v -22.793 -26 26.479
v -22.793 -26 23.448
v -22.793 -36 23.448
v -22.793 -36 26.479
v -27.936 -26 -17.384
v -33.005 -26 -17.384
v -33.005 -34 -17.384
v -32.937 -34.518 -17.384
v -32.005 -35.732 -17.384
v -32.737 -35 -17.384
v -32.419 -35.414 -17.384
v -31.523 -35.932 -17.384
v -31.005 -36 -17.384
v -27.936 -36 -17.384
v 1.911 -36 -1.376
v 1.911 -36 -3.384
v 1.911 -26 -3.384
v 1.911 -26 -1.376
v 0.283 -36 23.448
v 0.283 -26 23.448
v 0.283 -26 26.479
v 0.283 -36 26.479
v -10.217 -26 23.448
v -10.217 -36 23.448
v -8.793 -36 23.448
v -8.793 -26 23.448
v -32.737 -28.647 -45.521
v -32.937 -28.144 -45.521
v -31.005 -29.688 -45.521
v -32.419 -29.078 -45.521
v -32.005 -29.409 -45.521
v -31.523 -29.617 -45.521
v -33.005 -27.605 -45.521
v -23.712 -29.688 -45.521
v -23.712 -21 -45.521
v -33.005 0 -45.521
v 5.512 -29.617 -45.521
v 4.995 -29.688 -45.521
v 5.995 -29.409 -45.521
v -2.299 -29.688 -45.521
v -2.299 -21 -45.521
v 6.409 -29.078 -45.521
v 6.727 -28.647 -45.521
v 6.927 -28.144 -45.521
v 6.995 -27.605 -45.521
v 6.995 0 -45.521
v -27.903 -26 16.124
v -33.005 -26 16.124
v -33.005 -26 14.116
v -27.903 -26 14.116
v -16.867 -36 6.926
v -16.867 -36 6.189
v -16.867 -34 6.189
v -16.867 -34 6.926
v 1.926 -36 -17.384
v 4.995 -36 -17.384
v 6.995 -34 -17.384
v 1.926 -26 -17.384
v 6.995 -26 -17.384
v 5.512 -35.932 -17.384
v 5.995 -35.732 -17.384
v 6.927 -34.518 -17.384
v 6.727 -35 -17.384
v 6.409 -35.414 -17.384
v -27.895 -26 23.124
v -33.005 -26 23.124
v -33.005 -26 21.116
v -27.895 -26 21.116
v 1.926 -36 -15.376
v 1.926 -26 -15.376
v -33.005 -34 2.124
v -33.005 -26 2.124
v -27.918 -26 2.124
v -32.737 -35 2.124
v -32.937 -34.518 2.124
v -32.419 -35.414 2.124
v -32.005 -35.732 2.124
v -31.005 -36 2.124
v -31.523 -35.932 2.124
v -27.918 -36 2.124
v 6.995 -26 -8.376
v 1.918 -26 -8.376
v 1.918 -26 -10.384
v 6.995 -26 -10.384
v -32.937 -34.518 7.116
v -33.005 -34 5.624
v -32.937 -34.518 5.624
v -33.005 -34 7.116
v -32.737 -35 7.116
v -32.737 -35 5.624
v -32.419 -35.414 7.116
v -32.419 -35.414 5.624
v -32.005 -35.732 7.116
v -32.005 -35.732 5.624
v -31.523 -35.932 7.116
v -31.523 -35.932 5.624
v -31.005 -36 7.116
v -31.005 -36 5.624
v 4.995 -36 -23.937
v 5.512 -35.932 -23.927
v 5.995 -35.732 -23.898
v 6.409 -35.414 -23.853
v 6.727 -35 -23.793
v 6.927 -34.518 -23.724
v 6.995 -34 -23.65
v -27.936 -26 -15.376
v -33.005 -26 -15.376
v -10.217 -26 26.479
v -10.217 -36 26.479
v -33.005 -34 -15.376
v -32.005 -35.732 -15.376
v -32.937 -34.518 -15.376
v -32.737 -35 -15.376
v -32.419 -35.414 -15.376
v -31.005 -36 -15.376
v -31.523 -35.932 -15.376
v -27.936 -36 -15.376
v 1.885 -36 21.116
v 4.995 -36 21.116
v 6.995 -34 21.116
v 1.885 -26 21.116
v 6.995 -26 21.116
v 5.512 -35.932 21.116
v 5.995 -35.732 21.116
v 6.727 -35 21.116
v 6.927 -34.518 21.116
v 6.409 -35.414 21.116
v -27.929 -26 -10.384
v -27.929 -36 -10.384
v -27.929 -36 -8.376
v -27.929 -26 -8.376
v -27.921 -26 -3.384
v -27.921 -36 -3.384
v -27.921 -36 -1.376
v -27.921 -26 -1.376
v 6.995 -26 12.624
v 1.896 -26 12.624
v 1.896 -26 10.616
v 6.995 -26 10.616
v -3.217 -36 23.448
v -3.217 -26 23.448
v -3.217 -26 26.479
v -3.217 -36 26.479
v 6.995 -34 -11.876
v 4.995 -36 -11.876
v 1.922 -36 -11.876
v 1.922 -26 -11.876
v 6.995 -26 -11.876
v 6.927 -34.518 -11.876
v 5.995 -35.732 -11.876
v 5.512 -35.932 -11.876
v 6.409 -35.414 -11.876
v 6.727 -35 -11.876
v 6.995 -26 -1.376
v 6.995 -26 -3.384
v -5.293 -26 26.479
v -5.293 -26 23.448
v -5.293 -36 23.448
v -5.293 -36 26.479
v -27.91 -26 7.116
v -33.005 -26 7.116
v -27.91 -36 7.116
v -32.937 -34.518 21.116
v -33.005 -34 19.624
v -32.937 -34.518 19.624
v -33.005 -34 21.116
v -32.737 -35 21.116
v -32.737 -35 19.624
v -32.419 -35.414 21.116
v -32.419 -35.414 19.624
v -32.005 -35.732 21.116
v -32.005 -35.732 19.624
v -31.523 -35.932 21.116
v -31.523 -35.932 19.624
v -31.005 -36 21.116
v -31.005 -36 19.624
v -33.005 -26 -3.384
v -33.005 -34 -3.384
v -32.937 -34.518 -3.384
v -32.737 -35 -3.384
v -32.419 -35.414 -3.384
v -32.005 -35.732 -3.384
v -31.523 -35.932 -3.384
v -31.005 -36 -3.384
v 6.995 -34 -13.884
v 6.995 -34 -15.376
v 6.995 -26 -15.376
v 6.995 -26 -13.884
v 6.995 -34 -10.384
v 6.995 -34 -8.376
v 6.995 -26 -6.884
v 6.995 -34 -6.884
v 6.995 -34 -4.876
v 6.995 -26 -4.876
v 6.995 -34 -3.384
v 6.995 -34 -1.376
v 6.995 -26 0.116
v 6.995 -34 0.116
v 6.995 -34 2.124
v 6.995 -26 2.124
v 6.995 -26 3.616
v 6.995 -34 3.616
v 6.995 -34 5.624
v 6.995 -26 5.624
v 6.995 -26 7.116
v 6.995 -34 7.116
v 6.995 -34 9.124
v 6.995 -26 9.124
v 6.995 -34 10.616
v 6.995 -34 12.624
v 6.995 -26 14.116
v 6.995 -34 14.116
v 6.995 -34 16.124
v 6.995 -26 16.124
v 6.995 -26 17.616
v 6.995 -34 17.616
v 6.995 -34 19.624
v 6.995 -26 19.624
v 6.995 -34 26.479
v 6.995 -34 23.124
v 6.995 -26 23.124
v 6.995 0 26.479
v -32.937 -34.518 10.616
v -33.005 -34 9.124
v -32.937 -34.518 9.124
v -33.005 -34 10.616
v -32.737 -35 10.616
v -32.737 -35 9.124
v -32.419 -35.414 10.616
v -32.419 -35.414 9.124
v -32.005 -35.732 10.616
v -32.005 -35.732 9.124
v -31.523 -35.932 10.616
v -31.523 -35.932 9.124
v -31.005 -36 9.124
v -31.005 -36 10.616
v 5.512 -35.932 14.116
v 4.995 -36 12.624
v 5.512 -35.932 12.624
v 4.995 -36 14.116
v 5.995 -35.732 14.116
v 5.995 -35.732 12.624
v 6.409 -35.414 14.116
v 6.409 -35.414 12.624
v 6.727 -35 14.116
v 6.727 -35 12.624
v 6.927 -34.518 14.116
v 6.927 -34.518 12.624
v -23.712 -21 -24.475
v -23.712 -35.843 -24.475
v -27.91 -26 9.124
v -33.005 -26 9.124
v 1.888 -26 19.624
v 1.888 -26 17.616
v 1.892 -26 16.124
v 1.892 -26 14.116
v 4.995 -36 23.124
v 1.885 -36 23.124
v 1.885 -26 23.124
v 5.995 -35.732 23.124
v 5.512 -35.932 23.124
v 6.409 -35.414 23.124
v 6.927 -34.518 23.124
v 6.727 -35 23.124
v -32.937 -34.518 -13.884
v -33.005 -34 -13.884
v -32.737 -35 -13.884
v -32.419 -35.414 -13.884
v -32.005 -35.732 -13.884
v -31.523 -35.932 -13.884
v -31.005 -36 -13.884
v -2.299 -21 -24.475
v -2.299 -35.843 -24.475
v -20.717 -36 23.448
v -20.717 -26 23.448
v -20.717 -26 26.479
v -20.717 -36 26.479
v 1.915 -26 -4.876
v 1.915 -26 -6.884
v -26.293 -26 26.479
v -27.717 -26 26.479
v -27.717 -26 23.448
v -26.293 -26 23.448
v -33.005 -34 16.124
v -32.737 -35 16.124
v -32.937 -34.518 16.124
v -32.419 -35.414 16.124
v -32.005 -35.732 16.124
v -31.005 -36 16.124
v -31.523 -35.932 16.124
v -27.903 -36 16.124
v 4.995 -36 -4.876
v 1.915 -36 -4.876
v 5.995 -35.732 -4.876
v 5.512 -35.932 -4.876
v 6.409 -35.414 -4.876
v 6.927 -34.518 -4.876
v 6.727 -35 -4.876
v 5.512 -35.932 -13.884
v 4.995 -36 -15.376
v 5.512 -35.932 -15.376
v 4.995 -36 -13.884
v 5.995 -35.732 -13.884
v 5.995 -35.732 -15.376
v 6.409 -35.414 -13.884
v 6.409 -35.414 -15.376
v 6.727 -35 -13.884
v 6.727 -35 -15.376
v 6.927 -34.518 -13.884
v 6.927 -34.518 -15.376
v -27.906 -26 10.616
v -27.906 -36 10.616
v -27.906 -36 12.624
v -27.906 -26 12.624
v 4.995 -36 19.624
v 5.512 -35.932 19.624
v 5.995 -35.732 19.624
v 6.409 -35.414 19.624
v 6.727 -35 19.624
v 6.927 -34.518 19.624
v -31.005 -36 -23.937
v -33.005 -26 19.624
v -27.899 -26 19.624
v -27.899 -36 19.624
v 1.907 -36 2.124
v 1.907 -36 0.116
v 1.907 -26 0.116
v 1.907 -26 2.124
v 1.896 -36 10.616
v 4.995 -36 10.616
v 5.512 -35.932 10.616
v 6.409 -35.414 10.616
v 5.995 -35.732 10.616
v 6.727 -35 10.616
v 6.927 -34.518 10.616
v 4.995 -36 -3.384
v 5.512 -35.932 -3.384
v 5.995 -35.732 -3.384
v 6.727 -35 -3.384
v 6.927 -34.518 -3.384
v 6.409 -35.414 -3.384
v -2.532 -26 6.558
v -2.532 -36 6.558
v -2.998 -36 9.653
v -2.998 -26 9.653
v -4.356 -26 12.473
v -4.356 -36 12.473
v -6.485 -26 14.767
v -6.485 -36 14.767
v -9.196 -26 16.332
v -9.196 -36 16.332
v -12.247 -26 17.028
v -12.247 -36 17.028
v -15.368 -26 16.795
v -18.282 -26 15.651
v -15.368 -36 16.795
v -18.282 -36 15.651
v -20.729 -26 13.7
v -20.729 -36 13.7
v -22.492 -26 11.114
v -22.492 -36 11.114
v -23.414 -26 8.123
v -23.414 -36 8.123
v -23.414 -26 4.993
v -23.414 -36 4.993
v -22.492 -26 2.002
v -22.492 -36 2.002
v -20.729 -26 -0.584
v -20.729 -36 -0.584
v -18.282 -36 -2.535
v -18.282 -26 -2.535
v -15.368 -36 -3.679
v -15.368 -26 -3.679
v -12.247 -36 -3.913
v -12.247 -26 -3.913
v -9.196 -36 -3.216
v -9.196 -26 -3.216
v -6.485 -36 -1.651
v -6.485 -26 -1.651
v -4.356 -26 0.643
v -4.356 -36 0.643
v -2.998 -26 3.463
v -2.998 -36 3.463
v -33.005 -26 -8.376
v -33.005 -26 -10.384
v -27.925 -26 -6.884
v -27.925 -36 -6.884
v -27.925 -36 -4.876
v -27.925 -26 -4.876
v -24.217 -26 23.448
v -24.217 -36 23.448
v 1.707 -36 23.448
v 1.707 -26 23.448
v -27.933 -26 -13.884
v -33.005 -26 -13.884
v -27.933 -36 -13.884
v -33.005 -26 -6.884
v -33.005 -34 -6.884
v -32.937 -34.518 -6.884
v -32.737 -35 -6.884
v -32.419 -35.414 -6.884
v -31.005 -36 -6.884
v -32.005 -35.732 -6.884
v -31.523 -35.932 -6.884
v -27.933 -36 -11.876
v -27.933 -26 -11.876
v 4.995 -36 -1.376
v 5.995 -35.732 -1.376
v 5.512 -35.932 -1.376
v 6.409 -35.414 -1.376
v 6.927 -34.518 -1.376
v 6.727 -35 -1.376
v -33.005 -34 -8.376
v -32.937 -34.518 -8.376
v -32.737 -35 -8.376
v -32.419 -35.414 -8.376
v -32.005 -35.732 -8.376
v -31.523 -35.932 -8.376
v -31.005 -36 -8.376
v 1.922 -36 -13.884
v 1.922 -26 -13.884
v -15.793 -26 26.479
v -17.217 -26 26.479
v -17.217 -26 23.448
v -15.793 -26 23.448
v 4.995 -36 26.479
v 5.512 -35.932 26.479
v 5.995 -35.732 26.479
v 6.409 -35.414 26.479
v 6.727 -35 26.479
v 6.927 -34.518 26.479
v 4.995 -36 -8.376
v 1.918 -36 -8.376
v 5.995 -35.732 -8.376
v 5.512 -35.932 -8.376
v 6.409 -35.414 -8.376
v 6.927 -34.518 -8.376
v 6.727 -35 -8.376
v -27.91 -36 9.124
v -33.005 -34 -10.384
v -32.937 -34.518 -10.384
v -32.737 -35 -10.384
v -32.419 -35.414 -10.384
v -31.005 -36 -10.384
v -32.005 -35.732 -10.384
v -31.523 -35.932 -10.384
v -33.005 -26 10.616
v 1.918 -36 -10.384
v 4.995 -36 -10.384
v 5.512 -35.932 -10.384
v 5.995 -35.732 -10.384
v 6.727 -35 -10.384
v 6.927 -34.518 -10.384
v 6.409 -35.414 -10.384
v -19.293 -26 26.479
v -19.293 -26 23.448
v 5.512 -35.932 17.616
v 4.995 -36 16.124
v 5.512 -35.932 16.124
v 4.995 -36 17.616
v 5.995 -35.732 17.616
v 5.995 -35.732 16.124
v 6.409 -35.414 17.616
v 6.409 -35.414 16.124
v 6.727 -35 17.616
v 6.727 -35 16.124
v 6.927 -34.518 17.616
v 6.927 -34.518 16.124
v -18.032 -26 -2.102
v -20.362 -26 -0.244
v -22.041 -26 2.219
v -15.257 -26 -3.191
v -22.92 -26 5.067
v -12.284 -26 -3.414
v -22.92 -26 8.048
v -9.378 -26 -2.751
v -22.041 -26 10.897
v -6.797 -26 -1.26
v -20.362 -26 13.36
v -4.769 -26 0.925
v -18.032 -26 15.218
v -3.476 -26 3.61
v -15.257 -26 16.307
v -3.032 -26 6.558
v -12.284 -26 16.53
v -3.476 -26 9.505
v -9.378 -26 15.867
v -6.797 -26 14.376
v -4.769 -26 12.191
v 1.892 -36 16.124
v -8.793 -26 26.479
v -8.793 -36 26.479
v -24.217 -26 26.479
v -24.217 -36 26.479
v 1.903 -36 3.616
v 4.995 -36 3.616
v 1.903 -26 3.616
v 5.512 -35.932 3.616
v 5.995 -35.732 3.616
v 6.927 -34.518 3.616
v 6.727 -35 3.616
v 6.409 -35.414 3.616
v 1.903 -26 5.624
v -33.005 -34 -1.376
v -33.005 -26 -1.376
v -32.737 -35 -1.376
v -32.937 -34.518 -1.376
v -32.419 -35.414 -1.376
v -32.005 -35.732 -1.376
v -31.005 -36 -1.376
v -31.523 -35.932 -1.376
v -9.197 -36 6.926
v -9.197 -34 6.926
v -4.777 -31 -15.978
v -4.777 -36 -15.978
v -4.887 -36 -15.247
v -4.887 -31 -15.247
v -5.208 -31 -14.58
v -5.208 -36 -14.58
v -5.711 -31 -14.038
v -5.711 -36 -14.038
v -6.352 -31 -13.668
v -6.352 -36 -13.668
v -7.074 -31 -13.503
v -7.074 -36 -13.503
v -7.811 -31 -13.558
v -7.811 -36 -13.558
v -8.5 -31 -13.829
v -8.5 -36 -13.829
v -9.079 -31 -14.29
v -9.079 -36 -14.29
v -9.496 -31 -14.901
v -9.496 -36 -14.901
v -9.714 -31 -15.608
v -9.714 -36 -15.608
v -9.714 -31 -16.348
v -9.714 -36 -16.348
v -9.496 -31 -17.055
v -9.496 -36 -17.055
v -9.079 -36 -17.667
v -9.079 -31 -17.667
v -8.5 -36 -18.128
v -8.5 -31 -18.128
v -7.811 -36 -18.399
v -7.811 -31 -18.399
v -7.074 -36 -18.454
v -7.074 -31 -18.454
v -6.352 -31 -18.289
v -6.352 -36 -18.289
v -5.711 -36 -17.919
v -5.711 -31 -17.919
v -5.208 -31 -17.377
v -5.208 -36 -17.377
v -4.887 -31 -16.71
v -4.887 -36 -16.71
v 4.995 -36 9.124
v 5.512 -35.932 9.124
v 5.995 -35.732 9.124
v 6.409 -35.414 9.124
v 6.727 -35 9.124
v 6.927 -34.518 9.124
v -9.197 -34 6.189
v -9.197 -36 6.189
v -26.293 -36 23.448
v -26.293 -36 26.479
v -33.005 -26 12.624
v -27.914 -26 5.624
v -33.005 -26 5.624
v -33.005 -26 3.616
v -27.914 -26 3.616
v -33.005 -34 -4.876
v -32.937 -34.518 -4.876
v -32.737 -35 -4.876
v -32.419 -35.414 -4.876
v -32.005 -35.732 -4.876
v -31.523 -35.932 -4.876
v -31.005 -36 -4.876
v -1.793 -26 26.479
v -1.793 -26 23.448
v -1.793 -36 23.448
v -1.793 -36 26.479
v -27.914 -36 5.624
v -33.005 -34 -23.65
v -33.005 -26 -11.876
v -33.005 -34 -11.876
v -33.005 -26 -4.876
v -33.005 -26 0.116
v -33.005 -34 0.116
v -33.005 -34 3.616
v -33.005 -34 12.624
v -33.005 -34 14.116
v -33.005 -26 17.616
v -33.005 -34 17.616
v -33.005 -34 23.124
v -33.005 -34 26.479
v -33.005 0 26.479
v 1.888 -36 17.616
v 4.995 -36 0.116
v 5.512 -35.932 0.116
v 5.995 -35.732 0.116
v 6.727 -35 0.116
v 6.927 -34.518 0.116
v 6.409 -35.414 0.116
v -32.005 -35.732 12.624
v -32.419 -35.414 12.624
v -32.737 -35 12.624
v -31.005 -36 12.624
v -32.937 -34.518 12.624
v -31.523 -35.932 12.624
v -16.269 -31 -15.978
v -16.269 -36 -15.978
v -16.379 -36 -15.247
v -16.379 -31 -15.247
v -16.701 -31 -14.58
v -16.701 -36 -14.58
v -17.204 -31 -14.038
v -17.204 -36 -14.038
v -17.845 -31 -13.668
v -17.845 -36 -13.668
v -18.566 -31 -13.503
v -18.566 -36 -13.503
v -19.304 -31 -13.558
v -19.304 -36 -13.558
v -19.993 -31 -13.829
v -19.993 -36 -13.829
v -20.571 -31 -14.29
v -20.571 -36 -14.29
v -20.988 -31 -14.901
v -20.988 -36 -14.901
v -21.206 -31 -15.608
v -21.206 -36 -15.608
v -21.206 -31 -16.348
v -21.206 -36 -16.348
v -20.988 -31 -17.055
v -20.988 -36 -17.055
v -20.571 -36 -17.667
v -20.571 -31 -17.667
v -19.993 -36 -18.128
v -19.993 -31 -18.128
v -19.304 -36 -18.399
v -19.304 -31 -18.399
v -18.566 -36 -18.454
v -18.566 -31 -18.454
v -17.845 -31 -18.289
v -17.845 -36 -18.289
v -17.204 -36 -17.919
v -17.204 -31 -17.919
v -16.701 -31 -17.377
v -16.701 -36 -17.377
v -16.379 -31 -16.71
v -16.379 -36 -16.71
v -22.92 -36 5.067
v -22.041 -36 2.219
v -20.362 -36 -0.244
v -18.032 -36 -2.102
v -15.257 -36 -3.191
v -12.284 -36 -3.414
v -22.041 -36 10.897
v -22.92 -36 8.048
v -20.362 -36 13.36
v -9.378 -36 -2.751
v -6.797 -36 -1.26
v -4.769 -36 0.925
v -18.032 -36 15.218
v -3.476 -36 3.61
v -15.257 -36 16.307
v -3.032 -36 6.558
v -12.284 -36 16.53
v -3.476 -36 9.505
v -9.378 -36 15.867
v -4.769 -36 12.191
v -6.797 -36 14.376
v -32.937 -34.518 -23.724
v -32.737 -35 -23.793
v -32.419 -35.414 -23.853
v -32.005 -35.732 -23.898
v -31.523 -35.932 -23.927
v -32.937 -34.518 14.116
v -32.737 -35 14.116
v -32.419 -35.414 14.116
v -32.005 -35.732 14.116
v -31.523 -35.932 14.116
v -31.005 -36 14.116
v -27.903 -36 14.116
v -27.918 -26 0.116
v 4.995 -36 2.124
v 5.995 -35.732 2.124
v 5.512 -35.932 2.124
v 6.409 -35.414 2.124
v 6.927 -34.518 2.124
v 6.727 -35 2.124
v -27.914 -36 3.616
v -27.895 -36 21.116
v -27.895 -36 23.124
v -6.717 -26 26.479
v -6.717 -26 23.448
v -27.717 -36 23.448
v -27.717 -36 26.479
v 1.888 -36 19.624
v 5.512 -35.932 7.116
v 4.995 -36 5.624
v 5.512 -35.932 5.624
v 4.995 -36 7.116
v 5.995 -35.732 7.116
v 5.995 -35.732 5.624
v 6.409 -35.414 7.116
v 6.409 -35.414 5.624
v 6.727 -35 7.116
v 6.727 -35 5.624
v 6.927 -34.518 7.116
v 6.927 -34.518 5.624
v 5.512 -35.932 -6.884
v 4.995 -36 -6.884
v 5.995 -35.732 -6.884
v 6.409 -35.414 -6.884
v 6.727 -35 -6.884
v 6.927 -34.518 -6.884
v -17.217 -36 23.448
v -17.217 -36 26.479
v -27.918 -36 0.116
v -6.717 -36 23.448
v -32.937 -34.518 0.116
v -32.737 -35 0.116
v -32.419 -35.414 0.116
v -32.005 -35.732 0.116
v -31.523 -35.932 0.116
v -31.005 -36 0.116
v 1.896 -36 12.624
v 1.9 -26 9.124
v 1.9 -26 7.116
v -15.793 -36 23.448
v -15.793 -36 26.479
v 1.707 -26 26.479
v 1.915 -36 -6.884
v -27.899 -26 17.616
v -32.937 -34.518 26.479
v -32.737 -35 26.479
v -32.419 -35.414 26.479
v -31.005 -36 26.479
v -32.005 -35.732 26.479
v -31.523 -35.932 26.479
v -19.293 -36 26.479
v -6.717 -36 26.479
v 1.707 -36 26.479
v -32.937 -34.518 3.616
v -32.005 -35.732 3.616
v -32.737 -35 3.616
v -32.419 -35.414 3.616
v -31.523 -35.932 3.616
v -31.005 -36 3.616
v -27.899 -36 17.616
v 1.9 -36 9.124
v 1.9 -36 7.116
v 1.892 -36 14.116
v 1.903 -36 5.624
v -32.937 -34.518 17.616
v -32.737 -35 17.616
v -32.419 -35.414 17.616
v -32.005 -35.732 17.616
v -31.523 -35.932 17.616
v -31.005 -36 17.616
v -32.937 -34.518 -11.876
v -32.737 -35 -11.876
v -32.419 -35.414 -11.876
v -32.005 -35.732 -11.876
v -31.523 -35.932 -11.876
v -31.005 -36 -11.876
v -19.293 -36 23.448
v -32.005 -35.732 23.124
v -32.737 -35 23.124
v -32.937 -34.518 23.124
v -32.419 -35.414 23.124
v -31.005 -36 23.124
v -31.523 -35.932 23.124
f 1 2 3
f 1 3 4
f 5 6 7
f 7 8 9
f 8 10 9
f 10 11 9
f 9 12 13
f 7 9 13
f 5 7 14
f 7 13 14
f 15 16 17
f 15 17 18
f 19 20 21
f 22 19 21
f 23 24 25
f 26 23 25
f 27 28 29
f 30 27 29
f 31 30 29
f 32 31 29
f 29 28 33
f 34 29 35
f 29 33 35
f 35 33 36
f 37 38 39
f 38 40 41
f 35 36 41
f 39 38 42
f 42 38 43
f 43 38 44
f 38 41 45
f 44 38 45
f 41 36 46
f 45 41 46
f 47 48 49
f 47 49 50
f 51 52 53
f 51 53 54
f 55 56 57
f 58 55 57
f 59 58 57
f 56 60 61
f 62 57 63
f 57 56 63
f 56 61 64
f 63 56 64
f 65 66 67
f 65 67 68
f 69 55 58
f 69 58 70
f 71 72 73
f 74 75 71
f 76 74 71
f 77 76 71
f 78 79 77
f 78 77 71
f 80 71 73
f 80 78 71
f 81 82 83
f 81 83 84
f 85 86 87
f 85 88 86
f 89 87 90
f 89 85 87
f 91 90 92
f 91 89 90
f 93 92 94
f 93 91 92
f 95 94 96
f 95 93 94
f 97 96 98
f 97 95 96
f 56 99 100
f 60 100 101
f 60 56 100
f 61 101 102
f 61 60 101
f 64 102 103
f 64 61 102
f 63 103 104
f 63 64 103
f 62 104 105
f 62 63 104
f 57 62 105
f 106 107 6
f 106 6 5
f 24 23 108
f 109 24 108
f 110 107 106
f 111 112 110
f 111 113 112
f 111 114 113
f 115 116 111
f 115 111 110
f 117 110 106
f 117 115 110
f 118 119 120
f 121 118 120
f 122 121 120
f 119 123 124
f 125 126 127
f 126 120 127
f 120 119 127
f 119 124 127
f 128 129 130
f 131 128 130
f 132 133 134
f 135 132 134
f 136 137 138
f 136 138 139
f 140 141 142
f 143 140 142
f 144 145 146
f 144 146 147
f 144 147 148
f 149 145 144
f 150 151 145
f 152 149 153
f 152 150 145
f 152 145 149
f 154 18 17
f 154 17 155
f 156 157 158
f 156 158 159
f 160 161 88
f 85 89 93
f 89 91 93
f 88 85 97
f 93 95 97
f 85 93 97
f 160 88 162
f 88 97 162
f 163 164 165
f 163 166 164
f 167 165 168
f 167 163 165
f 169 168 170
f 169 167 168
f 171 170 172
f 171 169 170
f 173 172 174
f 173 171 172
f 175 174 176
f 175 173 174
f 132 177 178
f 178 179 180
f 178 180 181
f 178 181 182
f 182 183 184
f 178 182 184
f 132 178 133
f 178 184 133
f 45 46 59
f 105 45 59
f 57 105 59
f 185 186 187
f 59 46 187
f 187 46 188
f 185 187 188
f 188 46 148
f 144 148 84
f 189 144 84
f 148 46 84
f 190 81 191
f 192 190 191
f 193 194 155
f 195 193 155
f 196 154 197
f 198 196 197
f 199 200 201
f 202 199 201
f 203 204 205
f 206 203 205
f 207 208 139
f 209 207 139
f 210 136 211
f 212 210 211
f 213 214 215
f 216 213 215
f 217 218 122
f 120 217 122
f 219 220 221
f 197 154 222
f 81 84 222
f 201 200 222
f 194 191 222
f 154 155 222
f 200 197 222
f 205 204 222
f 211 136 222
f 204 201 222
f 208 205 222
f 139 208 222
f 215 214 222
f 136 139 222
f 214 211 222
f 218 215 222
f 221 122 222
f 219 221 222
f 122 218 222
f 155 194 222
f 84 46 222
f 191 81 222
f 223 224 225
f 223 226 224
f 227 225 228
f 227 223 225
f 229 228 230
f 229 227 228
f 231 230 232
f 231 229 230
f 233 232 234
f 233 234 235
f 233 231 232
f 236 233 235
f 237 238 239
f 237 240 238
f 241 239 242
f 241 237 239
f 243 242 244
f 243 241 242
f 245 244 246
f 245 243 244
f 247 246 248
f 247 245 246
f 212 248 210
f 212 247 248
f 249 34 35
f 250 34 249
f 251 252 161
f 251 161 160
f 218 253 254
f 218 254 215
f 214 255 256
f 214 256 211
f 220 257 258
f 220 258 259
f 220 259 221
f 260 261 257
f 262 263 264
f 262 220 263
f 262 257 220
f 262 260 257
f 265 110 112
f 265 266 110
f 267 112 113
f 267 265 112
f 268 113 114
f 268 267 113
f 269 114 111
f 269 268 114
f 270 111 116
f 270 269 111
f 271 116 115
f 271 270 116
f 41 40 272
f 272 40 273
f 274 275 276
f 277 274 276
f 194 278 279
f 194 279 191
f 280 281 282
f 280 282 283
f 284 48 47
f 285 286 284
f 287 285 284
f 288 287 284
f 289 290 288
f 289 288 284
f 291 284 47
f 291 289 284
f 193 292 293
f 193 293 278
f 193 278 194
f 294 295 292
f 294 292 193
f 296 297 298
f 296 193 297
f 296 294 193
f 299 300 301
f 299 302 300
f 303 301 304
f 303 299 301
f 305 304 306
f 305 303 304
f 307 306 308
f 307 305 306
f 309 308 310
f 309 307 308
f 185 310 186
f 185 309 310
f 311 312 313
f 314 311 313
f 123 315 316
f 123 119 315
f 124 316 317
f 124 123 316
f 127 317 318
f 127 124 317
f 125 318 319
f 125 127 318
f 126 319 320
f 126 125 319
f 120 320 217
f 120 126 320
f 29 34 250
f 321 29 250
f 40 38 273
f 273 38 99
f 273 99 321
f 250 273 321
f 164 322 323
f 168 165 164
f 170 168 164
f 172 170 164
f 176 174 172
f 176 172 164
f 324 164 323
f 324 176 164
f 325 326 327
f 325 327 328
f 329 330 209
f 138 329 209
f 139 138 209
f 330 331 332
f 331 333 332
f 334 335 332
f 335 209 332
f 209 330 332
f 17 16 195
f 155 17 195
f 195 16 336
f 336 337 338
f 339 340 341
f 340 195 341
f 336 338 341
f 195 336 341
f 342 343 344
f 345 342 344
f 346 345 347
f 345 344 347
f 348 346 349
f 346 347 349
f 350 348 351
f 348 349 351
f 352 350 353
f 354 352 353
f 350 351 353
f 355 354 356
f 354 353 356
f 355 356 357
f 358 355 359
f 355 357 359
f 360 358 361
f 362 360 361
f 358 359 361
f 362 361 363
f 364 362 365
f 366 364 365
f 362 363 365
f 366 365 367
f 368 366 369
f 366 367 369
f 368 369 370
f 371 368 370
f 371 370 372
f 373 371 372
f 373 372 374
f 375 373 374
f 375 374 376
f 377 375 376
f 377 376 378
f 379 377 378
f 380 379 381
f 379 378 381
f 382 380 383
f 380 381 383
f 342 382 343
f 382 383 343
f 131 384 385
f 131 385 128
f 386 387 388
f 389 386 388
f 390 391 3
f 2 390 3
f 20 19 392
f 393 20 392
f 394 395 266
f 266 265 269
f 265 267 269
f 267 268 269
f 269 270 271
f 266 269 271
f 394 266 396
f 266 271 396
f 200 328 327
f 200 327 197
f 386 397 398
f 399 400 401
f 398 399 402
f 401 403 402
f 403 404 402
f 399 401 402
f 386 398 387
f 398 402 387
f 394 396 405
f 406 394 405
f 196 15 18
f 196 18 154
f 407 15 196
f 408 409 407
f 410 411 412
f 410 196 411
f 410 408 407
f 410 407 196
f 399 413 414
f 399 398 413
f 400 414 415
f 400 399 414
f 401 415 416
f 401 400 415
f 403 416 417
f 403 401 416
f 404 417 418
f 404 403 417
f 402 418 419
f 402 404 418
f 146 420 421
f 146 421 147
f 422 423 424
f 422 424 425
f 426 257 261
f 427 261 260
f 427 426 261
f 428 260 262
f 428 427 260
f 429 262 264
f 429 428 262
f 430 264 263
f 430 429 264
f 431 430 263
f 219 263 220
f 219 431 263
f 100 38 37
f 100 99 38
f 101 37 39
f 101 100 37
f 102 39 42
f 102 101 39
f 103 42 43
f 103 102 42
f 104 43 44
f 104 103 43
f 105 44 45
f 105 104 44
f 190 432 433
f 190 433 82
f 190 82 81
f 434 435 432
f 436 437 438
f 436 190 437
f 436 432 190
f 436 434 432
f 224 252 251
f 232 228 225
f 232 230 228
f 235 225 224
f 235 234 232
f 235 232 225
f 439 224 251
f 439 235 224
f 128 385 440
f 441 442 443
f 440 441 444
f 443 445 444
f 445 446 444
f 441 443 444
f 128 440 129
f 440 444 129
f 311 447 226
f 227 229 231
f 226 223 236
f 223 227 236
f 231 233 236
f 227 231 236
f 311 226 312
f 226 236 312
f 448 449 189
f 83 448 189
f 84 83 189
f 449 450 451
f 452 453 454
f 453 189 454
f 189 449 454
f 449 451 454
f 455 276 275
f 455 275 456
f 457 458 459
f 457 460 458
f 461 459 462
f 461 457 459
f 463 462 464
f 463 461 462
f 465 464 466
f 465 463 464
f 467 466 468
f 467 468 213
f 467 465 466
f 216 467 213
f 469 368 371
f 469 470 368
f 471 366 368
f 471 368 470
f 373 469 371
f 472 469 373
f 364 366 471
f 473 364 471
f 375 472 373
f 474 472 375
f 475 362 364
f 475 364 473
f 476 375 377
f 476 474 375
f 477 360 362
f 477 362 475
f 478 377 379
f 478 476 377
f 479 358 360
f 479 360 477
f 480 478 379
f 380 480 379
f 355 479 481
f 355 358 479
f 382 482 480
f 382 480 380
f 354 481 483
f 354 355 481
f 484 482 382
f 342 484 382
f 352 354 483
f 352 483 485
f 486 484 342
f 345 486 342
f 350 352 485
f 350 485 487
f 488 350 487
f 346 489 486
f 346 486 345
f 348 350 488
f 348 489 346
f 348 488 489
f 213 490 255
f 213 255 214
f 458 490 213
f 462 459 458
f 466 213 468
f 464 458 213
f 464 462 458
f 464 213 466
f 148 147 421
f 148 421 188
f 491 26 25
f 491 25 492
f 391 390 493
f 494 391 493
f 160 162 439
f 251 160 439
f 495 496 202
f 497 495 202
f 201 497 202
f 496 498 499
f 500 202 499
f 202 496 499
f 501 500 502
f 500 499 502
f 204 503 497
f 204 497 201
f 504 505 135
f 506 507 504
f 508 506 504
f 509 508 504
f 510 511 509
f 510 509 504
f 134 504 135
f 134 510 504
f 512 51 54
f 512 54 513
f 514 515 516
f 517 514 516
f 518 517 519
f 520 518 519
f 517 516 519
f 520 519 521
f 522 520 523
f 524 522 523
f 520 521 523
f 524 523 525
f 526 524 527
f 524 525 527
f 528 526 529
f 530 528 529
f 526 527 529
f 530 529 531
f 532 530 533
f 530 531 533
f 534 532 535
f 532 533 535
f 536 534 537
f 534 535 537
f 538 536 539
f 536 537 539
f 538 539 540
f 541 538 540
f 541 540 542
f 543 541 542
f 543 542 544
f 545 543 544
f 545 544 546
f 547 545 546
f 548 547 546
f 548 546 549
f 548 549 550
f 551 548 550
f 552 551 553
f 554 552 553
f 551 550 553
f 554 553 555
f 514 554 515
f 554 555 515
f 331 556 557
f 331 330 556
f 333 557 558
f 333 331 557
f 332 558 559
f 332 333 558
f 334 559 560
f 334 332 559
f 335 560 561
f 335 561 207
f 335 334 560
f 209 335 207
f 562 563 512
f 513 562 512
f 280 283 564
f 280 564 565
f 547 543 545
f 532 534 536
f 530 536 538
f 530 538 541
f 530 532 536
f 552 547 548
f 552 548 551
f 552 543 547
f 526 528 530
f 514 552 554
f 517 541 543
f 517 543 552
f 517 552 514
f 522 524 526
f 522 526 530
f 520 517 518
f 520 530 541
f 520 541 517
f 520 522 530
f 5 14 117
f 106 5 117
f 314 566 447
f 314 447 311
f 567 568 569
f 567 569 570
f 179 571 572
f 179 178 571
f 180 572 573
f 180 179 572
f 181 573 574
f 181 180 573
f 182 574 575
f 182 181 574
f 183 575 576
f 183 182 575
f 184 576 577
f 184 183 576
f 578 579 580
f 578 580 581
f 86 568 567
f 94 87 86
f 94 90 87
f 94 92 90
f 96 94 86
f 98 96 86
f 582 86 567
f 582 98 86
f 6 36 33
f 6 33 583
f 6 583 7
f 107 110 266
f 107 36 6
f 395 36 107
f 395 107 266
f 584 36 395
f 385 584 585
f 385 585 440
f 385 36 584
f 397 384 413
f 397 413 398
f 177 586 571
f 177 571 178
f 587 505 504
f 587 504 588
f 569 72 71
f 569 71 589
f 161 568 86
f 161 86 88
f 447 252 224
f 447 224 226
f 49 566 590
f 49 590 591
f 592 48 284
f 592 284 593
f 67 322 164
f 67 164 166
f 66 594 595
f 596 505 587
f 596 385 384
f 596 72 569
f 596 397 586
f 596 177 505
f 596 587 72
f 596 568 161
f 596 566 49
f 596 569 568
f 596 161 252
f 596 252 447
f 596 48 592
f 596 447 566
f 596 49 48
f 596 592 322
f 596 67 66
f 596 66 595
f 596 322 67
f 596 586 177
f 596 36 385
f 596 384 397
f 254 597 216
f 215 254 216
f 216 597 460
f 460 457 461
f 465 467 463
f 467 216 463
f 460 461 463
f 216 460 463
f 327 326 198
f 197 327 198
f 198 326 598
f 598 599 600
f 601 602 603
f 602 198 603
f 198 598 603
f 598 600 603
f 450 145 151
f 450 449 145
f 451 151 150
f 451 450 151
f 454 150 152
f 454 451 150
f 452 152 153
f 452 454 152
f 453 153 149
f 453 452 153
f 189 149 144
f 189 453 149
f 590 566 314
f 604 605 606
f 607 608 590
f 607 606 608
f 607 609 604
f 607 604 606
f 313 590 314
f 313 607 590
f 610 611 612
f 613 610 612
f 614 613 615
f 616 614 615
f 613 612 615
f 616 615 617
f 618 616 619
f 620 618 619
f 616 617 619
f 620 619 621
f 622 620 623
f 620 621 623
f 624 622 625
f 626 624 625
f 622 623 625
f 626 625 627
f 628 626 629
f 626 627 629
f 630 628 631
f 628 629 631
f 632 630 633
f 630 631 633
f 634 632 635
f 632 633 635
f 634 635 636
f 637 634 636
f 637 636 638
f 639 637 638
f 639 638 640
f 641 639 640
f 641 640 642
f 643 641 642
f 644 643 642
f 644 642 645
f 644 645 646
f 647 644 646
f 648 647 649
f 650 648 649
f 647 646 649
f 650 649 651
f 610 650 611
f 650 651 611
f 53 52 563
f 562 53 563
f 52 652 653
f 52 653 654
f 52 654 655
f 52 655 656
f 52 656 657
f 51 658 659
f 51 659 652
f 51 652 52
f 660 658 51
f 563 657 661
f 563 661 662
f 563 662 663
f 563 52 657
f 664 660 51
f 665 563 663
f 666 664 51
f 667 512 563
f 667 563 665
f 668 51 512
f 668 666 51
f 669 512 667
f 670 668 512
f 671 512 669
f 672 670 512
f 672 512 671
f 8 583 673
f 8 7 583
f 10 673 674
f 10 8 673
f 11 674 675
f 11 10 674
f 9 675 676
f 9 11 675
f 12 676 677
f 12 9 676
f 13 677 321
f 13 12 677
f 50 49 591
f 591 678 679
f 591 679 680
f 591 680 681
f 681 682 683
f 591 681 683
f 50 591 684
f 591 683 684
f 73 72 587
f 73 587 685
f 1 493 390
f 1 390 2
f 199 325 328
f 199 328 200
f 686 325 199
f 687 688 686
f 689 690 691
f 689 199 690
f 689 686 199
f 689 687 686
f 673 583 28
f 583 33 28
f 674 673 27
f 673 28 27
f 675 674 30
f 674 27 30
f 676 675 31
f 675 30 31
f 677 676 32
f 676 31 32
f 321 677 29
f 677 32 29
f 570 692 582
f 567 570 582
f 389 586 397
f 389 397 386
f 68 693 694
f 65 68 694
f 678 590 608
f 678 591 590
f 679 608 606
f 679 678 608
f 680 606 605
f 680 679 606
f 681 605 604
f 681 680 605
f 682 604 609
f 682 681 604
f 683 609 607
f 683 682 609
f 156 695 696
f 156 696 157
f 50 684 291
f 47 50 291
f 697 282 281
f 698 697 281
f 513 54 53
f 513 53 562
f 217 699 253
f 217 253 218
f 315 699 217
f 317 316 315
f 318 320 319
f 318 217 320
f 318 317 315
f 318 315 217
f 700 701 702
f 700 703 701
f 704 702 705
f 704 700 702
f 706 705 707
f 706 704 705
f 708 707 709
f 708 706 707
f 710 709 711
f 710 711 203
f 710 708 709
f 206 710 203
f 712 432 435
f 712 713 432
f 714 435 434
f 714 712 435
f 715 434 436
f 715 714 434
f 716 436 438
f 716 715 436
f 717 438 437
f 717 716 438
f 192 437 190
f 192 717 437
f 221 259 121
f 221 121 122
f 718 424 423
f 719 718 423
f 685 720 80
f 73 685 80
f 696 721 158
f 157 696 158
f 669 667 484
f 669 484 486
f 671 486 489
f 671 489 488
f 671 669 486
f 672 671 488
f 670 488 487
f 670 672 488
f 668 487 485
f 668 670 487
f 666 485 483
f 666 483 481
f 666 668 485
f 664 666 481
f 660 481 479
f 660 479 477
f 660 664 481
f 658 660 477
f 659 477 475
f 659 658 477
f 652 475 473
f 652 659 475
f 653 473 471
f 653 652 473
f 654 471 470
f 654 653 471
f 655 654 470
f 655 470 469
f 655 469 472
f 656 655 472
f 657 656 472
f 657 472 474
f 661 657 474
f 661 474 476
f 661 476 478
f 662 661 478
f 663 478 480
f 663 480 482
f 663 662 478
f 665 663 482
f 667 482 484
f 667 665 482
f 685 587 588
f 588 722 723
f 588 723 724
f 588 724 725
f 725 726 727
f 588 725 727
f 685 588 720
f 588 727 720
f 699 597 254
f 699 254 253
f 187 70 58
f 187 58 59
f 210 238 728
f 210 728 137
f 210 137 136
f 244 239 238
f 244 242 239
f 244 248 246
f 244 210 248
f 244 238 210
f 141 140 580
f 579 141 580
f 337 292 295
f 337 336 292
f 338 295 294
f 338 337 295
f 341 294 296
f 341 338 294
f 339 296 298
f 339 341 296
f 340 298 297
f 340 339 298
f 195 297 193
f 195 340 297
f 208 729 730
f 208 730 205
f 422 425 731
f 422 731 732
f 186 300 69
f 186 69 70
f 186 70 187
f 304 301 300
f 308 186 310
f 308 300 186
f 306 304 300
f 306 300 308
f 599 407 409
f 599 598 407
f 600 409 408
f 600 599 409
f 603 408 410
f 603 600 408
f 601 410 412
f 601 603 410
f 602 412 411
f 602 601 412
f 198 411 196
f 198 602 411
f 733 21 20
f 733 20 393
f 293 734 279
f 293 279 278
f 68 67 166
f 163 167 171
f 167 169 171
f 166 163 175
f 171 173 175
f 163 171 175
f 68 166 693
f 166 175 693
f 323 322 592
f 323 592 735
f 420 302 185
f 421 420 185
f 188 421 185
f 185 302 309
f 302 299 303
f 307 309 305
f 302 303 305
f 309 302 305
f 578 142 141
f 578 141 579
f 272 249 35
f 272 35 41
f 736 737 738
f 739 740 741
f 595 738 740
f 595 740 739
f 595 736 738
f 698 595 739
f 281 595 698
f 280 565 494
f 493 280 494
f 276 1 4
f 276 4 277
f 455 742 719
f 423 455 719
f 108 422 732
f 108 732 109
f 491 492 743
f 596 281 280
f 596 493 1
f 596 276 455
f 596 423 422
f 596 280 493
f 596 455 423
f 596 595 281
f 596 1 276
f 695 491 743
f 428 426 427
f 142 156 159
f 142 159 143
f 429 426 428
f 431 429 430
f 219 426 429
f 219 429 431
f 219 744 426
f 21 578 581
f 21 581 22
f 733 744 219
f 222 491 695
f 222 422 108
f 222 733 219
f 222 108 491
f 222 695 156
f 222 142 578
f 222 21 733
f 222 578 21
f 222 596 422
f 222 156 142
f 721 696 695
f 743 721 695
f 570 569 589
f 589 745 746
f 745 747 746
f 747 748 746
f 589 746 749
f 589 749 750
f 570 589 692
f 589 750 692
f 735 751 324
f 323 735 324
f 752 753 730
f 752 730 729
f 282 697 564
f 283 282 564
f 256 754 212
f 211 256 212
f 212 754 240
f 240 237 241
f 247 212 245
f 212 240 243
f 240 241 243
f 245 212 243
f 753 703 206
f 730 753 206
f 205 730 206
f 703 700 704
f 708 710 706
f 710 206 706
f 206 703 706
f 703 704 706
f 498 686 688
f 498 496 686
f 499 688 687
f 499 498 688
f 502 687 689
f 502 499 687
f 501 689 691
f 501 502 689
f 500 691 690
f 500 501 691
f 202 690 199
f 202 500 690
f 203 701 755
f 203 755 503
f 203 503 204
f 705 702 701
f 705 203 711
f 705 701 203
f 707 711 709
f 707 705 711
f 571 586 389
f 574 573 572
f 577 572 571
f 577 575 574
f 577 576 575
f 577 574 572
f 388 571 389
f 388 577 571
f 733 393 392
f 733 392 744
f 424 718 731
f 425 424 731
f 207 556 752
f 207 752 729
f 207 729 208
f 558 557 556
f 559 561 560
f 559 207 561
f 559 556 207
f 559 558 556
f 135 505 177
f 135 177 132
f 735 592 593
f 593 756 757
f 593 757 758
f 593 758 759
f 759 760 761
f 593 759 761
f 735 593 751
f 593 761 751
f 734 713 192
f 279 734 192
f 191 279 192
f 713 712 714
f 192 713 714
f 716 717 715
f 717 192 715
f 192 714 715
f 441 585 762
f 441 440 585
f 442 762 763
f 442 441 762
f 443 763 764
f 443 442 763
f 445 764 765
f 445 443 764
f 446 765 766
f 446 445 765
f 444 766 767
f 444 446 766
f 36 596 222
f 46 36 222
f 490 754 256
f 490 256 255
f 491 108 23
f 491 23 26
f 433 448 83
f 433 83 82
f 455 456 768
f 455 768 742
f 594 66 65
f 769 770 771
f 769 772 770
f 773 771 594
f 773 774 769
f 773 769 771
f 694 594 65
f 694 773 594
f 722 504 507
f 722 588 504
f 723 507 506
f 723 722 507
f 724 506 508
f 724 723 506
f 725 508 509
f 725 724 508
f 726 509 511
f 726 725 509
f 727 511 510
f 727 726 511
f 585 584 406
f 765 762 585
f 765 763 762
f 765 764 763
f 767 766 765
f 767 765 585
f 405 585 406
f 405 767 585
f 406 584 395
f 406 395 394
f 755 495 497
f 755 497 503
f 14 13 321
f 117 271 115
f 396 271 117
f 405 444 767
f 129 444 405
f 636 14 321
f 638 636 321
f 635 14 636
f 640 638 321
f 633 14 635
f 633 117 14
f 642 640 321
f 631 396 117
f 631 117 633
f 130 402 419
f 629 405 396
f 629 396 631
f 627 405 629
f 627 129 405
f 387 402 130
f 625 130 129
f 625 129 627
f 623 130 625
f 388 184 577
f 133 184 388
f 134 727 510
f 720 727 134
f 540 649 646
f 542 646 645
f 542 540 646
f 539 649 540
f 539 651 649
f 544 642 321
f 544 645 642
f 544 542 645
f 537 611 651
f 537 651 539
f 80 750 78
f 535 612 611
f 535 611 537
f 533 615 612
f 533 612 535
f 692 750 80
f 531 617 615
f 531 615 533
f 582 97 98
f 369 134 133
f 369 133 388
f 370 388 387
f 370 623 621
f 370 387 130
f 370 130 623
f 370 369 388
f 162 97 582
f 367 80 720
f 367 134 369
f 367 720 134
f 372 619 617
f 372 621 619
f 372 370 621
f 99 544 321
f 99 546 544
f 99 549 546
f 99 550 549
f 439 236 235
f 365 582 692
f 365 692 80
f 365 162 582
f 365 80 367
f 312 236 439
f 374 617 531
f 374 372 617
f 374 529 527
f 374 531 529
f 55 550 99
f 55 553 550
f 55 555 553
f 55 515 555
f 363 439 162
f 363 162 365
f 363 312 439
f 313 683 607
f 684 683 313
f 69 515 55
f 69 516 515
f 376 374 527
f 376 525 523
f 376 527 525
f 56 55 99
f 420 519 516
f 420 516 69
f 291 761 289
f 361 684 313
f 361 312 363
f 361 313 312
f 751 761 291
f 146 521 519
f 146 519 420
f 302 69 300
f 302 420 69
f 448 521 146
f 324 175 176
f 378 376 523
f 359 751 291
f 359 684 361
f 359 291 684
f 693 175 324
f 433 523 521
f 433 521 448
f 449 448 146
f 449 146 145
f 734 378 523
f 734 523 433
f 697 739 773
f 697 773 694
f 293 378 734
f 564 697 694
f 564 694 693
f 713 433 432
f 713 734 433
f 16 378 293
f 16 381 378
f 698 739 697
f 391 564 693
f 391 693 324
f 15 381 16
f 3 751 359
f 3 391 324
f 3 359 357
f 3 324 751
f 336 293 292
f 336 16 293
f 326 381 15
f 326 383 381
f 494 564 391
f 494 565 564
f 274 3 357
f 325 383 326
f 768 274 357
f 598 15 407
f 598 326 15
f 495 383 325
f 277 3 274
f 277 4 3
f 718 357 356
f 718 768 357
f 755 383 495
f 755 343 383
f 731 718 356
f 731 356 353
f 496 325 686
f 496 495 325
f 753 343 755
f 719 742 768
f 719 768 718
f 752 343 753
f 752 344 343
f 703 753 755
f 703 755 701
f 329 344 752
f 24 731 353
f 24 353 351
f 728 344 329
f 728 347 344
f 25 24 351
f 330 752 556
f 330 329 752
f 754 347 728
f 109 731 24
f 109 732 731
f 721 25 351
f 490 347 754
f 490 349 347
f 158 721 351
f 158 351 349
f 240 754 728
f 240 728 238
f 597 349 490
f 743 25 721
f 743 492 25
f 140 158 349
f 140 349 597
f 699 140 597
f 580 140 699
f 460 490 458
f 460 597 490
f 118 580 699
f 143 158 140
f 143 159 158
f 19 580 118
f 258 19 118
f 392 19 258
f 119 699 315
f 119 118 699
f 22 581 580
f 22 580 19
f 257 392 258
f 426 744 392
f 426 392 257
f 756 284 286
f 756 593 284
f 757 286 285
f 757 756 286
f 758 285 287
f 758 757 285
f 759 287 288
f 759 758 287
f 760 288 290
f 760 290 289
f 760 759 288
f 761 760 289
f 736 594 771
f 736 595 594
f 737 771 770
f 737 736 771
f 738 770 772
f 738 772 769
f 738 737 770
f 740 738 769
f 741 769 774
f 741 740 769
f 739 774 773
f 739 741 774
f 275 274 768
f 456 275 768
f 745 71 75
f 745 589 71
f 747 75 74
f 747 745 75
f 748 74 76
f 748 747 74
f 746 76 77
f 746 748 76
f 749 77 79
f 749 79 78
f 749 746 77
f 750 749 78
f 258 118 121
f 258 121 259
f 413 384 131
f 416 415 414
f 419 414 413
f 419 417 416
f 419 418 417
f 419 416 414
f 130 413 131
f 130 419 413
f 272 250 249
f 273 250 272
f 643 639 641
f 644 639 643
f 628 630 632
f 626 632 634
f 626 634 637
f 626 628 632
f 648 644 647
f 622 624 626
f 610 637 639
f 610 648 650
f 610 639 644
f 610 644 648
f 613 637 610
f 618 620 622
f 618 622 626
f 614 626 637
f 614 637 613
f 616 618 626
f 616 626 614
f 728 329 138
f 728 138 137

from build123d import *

# Parameters (mm, degrees)
F0_W      = 40
F0_H      = 72
F1_DEPTH  = 36
F2_W      = 5.110045895
F2_H      = 2.0075347275
F2_W_2    = 5.1063122059
F2_W_3    = 5.1025785169
F2_W_4    = 5.0988448278
F2_W_5    = 5.0951111388
F2_W_6    = 5.0913774498
F2_W_7    = 5.0876437607
F2_W_8    = 5.0839100717
F2_W_9    = 5.0801763826
F2_W_10   = 5.0764426936
F2_W_11   = 5.0727090045
F2_W_12   = 5.0689753155
F2_W_13   = 1.42415151
F2_H_2    = 3.0305987895
F2_R      = 10.5
F2_R_2    = 10
F3_DEPTH  = 10
F4_W      = 7.6698157936
F4_H      = 0.7368782535
F5_DEPTH  = 2
F6_W      = 21.4133905619
F6_H      = 21.0468042642
F7_DEPTH  = 15
F9_DEPTH  = 50
F10_R     = 2.4823069634
F11_DEPTH = 5
F12_R     = 2


with BuildPart() as f1:
    # F0 (on Front) → F1 (new body)
    with BuildSketch(Plane.XZ):
        with Locations((-13.0052822828, -9.5213338137)):
            Rectangle(F0_W, F0_H)
    extrude(amount=F1_DEPTH)

    # F2 (on face) → F3 (cut)
    with BuildSketch(Plane.XZ.offset(36)):
        with Locations((-30.4502593353, 22.1199980006)):
            Rectangle(F2_W, F2_H)
        with Locations((-30.4521261799, 18.6199999921)):
            Rectangle(F2_W_2, F2_H)
        with Locations((-30.4539930244, 15.1200019835)):
            Rectangle(F2_W_3, F2_H)
        with Locations((-30.4558598689, 11.620003975)):
            Rectangle(F2_W_4, F2_H)
        with Locations((-30.4577267134, 8.1200059665)):
            Rectangle(F2_W_5, F2_H)
        with Locations((-30.459593558, 4.620007958)):
            Rectangle(F2_W_6, F2_H)
        with Locations((-30.4614604025, 1.1200099495)):
            Rectangle(F2_W_7, F2_H)
        with Locations((-30.463327247, -2.379988059)):
            Rectangle(F2_W_8, F2_H)
        with Locations((-30.4651940915, -5.8799860675)):
            Rectangle(F2_W_9, F2_H)
        with Locations((-30.467060936, -9.379984076)):
            Rectangle(F2_W_10, F2_H)
        with Locations((-30.4689277806, -12.8799820845)):
            Rectangle(F2_W_11, F2_H)
        with Locations((-30.4707946251, -16.379980093)):
            Rectangle(F2_W_12, F2_H)
        with Locations((4.4602300594, -16.379980093)):
            Rectangle(F2_W_12, F2_H)
        with Locations((4.4583632149, -12.8799820845)):
            Rectangle(F2_W_11, F2_H)
        with Locations((4.4564963704, -9.379984076)):
            Rectangle(F2_W_10, F2_H)
        with Locations((4.4546295259, -5.8799860675)):
            Rectangle(F2_W_9, F2_H)
        with Locations((4.4508958368, 1.1200099495)):
            Rectangle(F2_W_7, F2_H)
        with Locations((4.4490289923, 4.620007958)):
            Rectangle(F2_W_6, F2_H)
        with Locations((4.4471621478, 8.1200059665)):
            Rectangle(F2_W_5, F2_H)
        with Locations((4.4452953032, 11.620003975)):
            Rectangle(F2_W_4, F2_H)
        with Locations((4.4434284587, 15.1200019835)):
            Rectangle(F2_W_3, F2_H)
        with Locations((4.4415616142, 18.6199999921)):
            Rectangle(F2_W_2, F2_H)
        with Locations((4.4396947697, 22.1199980006)):
            Rectangle(F2_W, F2_H)
        with Locations((0.9947177172, 24.9633667916)):
            Rectangle(F2_W_13, F2_H_2)
        with Locations((-2.5052822828, 24.9633667916)):
            Rectangle(F2_W_13, F2_H_2)
        with Locations((-6.0052822828, 24.9633667916)):
            Rectangle(F2_W_13, F2_H_2)
        with Locations((-9.5052822828, 24.9633667916)):
            Rectangle(F2_W_13, F2_H_2)
        with Locations((-16.5052822828, 24.9633667916)):
            Rectangle(F2_W_13, F2_H_2)
        with Locations((-20.0052822828, 24.9633667916)):
            Rectangle(F2_W_13, F2_H_2)
        with Locations((-23.5052822828, 24.9633667916)):
            Rectangle(F2_W_13, F2_H_2)
        with Locations((-27.0052822828, 24.9633667916)):
            Rectangle(F2_W_13, F2_H_2)
        with Locations((4.4527626813, -2.379988059)):
            Rectangle(F2_W_8, F2_H)
        with Locations((-13.0316922441, 6.5578259528)):
            Circle(F2_R)
        with Locations((-13.0316922441, 6.5578259528)):
            Circle(F2_R_2, mode=Mode.SUBTRACT)
    extrude(amount=-F3_DEPTH, mode=Mode.SUBTRACT)

    # F4 (on face) → F5 (cut)
    with BuildSketch(Plane.XZ.offset(36)):
        with Locations((-13.0316922441, 6.5578259528)):
            Rectangle(F4_W, F4_H)
    extrude(amount=-F5_DEPTH, mode=Mode.SUBTRACT)

    # F6 (on face) → F7 (cut)
    with BuildSketch(Plane.XZ.offset(36)):
        with Locations((-13.0052822828, -34.9979316816)):
            Rectangle(F6_W, F6_H)
    extrude(amount=-F7_DEPTH, mode=Mode.SUBTRACT)

    # F8 (on face) → F9 (cut)
    with BuildSketch(Plane.YZ.offset(6.9947177172)):
        Polygon((-29.6883769333, -45.5213338137), (-36, -23.9366423339), (-36, -45.5213338137), align=None)
    extrude(amount=-F9_DEPTH, mode=Mode.SUBTRACT)

    # F10 (on face) → F11 (cut)
    with BuildSketch(Plane.XZ.offset(36)):
        with Locations((-18.7515150756, -15.9784462303)):
            Circle(F10_R)
        with Locations((-7.2590494901, -15.9784462303)):
            Circle(F10_R)
    extrude(amount=-F11_DEPTH, mode=Mode.SUBTRACT)

    # F12
    f12_edges = [f1.edges().sort_by_distance(p)[0] for p in [
        (-33.005282, -36, 24.801216),
        (-33.005282, -36, 20.369999),
        (-33.005282, -36, 16.870001),
        (-33.005282, -36, 13.370003),
        (-33.005282, -36, 9.870005),
        (-33.005282, -36, 6.370007),
        (-33.005282, -36, 2.870009),
        (-33.005282, -36, -0.629989),
        (-33.005282, -36, -4.129987),
        (-33.005282, -36, -7.629985),
        (-33.005282, -36, -11.129983),
        (-33.005282, -36, -14.629981),
        (-33.005282, -36, -20.660195),
        (-33.005282, -32.844188, -34.728988),
        (6.994718, -36, 24.801216),
        (6.994718, -36, 20.369999),
        (6.994718, -36, 16.870001),
        (6.994718, -36, 13.370003),
        (6.994718, -36, 9.870005),
        (6.994718, -36, 6.370007),
        (6.994718, -36, 2.870009),
        (6.994718, -36, -0.629989),
        (6.994718, -36, -4.129987),
        (6.994718, -36, -7.629985),
        (6.994718, -36, -11.129983),
        (6.994718, -36, -14.629981),
        (6.994718, -36, -20.660195),
        (6.994718, -32.844188, -34.728988),
    ]]
    fillet(f12_edges, radius=F12_R)


solid = f1.part
